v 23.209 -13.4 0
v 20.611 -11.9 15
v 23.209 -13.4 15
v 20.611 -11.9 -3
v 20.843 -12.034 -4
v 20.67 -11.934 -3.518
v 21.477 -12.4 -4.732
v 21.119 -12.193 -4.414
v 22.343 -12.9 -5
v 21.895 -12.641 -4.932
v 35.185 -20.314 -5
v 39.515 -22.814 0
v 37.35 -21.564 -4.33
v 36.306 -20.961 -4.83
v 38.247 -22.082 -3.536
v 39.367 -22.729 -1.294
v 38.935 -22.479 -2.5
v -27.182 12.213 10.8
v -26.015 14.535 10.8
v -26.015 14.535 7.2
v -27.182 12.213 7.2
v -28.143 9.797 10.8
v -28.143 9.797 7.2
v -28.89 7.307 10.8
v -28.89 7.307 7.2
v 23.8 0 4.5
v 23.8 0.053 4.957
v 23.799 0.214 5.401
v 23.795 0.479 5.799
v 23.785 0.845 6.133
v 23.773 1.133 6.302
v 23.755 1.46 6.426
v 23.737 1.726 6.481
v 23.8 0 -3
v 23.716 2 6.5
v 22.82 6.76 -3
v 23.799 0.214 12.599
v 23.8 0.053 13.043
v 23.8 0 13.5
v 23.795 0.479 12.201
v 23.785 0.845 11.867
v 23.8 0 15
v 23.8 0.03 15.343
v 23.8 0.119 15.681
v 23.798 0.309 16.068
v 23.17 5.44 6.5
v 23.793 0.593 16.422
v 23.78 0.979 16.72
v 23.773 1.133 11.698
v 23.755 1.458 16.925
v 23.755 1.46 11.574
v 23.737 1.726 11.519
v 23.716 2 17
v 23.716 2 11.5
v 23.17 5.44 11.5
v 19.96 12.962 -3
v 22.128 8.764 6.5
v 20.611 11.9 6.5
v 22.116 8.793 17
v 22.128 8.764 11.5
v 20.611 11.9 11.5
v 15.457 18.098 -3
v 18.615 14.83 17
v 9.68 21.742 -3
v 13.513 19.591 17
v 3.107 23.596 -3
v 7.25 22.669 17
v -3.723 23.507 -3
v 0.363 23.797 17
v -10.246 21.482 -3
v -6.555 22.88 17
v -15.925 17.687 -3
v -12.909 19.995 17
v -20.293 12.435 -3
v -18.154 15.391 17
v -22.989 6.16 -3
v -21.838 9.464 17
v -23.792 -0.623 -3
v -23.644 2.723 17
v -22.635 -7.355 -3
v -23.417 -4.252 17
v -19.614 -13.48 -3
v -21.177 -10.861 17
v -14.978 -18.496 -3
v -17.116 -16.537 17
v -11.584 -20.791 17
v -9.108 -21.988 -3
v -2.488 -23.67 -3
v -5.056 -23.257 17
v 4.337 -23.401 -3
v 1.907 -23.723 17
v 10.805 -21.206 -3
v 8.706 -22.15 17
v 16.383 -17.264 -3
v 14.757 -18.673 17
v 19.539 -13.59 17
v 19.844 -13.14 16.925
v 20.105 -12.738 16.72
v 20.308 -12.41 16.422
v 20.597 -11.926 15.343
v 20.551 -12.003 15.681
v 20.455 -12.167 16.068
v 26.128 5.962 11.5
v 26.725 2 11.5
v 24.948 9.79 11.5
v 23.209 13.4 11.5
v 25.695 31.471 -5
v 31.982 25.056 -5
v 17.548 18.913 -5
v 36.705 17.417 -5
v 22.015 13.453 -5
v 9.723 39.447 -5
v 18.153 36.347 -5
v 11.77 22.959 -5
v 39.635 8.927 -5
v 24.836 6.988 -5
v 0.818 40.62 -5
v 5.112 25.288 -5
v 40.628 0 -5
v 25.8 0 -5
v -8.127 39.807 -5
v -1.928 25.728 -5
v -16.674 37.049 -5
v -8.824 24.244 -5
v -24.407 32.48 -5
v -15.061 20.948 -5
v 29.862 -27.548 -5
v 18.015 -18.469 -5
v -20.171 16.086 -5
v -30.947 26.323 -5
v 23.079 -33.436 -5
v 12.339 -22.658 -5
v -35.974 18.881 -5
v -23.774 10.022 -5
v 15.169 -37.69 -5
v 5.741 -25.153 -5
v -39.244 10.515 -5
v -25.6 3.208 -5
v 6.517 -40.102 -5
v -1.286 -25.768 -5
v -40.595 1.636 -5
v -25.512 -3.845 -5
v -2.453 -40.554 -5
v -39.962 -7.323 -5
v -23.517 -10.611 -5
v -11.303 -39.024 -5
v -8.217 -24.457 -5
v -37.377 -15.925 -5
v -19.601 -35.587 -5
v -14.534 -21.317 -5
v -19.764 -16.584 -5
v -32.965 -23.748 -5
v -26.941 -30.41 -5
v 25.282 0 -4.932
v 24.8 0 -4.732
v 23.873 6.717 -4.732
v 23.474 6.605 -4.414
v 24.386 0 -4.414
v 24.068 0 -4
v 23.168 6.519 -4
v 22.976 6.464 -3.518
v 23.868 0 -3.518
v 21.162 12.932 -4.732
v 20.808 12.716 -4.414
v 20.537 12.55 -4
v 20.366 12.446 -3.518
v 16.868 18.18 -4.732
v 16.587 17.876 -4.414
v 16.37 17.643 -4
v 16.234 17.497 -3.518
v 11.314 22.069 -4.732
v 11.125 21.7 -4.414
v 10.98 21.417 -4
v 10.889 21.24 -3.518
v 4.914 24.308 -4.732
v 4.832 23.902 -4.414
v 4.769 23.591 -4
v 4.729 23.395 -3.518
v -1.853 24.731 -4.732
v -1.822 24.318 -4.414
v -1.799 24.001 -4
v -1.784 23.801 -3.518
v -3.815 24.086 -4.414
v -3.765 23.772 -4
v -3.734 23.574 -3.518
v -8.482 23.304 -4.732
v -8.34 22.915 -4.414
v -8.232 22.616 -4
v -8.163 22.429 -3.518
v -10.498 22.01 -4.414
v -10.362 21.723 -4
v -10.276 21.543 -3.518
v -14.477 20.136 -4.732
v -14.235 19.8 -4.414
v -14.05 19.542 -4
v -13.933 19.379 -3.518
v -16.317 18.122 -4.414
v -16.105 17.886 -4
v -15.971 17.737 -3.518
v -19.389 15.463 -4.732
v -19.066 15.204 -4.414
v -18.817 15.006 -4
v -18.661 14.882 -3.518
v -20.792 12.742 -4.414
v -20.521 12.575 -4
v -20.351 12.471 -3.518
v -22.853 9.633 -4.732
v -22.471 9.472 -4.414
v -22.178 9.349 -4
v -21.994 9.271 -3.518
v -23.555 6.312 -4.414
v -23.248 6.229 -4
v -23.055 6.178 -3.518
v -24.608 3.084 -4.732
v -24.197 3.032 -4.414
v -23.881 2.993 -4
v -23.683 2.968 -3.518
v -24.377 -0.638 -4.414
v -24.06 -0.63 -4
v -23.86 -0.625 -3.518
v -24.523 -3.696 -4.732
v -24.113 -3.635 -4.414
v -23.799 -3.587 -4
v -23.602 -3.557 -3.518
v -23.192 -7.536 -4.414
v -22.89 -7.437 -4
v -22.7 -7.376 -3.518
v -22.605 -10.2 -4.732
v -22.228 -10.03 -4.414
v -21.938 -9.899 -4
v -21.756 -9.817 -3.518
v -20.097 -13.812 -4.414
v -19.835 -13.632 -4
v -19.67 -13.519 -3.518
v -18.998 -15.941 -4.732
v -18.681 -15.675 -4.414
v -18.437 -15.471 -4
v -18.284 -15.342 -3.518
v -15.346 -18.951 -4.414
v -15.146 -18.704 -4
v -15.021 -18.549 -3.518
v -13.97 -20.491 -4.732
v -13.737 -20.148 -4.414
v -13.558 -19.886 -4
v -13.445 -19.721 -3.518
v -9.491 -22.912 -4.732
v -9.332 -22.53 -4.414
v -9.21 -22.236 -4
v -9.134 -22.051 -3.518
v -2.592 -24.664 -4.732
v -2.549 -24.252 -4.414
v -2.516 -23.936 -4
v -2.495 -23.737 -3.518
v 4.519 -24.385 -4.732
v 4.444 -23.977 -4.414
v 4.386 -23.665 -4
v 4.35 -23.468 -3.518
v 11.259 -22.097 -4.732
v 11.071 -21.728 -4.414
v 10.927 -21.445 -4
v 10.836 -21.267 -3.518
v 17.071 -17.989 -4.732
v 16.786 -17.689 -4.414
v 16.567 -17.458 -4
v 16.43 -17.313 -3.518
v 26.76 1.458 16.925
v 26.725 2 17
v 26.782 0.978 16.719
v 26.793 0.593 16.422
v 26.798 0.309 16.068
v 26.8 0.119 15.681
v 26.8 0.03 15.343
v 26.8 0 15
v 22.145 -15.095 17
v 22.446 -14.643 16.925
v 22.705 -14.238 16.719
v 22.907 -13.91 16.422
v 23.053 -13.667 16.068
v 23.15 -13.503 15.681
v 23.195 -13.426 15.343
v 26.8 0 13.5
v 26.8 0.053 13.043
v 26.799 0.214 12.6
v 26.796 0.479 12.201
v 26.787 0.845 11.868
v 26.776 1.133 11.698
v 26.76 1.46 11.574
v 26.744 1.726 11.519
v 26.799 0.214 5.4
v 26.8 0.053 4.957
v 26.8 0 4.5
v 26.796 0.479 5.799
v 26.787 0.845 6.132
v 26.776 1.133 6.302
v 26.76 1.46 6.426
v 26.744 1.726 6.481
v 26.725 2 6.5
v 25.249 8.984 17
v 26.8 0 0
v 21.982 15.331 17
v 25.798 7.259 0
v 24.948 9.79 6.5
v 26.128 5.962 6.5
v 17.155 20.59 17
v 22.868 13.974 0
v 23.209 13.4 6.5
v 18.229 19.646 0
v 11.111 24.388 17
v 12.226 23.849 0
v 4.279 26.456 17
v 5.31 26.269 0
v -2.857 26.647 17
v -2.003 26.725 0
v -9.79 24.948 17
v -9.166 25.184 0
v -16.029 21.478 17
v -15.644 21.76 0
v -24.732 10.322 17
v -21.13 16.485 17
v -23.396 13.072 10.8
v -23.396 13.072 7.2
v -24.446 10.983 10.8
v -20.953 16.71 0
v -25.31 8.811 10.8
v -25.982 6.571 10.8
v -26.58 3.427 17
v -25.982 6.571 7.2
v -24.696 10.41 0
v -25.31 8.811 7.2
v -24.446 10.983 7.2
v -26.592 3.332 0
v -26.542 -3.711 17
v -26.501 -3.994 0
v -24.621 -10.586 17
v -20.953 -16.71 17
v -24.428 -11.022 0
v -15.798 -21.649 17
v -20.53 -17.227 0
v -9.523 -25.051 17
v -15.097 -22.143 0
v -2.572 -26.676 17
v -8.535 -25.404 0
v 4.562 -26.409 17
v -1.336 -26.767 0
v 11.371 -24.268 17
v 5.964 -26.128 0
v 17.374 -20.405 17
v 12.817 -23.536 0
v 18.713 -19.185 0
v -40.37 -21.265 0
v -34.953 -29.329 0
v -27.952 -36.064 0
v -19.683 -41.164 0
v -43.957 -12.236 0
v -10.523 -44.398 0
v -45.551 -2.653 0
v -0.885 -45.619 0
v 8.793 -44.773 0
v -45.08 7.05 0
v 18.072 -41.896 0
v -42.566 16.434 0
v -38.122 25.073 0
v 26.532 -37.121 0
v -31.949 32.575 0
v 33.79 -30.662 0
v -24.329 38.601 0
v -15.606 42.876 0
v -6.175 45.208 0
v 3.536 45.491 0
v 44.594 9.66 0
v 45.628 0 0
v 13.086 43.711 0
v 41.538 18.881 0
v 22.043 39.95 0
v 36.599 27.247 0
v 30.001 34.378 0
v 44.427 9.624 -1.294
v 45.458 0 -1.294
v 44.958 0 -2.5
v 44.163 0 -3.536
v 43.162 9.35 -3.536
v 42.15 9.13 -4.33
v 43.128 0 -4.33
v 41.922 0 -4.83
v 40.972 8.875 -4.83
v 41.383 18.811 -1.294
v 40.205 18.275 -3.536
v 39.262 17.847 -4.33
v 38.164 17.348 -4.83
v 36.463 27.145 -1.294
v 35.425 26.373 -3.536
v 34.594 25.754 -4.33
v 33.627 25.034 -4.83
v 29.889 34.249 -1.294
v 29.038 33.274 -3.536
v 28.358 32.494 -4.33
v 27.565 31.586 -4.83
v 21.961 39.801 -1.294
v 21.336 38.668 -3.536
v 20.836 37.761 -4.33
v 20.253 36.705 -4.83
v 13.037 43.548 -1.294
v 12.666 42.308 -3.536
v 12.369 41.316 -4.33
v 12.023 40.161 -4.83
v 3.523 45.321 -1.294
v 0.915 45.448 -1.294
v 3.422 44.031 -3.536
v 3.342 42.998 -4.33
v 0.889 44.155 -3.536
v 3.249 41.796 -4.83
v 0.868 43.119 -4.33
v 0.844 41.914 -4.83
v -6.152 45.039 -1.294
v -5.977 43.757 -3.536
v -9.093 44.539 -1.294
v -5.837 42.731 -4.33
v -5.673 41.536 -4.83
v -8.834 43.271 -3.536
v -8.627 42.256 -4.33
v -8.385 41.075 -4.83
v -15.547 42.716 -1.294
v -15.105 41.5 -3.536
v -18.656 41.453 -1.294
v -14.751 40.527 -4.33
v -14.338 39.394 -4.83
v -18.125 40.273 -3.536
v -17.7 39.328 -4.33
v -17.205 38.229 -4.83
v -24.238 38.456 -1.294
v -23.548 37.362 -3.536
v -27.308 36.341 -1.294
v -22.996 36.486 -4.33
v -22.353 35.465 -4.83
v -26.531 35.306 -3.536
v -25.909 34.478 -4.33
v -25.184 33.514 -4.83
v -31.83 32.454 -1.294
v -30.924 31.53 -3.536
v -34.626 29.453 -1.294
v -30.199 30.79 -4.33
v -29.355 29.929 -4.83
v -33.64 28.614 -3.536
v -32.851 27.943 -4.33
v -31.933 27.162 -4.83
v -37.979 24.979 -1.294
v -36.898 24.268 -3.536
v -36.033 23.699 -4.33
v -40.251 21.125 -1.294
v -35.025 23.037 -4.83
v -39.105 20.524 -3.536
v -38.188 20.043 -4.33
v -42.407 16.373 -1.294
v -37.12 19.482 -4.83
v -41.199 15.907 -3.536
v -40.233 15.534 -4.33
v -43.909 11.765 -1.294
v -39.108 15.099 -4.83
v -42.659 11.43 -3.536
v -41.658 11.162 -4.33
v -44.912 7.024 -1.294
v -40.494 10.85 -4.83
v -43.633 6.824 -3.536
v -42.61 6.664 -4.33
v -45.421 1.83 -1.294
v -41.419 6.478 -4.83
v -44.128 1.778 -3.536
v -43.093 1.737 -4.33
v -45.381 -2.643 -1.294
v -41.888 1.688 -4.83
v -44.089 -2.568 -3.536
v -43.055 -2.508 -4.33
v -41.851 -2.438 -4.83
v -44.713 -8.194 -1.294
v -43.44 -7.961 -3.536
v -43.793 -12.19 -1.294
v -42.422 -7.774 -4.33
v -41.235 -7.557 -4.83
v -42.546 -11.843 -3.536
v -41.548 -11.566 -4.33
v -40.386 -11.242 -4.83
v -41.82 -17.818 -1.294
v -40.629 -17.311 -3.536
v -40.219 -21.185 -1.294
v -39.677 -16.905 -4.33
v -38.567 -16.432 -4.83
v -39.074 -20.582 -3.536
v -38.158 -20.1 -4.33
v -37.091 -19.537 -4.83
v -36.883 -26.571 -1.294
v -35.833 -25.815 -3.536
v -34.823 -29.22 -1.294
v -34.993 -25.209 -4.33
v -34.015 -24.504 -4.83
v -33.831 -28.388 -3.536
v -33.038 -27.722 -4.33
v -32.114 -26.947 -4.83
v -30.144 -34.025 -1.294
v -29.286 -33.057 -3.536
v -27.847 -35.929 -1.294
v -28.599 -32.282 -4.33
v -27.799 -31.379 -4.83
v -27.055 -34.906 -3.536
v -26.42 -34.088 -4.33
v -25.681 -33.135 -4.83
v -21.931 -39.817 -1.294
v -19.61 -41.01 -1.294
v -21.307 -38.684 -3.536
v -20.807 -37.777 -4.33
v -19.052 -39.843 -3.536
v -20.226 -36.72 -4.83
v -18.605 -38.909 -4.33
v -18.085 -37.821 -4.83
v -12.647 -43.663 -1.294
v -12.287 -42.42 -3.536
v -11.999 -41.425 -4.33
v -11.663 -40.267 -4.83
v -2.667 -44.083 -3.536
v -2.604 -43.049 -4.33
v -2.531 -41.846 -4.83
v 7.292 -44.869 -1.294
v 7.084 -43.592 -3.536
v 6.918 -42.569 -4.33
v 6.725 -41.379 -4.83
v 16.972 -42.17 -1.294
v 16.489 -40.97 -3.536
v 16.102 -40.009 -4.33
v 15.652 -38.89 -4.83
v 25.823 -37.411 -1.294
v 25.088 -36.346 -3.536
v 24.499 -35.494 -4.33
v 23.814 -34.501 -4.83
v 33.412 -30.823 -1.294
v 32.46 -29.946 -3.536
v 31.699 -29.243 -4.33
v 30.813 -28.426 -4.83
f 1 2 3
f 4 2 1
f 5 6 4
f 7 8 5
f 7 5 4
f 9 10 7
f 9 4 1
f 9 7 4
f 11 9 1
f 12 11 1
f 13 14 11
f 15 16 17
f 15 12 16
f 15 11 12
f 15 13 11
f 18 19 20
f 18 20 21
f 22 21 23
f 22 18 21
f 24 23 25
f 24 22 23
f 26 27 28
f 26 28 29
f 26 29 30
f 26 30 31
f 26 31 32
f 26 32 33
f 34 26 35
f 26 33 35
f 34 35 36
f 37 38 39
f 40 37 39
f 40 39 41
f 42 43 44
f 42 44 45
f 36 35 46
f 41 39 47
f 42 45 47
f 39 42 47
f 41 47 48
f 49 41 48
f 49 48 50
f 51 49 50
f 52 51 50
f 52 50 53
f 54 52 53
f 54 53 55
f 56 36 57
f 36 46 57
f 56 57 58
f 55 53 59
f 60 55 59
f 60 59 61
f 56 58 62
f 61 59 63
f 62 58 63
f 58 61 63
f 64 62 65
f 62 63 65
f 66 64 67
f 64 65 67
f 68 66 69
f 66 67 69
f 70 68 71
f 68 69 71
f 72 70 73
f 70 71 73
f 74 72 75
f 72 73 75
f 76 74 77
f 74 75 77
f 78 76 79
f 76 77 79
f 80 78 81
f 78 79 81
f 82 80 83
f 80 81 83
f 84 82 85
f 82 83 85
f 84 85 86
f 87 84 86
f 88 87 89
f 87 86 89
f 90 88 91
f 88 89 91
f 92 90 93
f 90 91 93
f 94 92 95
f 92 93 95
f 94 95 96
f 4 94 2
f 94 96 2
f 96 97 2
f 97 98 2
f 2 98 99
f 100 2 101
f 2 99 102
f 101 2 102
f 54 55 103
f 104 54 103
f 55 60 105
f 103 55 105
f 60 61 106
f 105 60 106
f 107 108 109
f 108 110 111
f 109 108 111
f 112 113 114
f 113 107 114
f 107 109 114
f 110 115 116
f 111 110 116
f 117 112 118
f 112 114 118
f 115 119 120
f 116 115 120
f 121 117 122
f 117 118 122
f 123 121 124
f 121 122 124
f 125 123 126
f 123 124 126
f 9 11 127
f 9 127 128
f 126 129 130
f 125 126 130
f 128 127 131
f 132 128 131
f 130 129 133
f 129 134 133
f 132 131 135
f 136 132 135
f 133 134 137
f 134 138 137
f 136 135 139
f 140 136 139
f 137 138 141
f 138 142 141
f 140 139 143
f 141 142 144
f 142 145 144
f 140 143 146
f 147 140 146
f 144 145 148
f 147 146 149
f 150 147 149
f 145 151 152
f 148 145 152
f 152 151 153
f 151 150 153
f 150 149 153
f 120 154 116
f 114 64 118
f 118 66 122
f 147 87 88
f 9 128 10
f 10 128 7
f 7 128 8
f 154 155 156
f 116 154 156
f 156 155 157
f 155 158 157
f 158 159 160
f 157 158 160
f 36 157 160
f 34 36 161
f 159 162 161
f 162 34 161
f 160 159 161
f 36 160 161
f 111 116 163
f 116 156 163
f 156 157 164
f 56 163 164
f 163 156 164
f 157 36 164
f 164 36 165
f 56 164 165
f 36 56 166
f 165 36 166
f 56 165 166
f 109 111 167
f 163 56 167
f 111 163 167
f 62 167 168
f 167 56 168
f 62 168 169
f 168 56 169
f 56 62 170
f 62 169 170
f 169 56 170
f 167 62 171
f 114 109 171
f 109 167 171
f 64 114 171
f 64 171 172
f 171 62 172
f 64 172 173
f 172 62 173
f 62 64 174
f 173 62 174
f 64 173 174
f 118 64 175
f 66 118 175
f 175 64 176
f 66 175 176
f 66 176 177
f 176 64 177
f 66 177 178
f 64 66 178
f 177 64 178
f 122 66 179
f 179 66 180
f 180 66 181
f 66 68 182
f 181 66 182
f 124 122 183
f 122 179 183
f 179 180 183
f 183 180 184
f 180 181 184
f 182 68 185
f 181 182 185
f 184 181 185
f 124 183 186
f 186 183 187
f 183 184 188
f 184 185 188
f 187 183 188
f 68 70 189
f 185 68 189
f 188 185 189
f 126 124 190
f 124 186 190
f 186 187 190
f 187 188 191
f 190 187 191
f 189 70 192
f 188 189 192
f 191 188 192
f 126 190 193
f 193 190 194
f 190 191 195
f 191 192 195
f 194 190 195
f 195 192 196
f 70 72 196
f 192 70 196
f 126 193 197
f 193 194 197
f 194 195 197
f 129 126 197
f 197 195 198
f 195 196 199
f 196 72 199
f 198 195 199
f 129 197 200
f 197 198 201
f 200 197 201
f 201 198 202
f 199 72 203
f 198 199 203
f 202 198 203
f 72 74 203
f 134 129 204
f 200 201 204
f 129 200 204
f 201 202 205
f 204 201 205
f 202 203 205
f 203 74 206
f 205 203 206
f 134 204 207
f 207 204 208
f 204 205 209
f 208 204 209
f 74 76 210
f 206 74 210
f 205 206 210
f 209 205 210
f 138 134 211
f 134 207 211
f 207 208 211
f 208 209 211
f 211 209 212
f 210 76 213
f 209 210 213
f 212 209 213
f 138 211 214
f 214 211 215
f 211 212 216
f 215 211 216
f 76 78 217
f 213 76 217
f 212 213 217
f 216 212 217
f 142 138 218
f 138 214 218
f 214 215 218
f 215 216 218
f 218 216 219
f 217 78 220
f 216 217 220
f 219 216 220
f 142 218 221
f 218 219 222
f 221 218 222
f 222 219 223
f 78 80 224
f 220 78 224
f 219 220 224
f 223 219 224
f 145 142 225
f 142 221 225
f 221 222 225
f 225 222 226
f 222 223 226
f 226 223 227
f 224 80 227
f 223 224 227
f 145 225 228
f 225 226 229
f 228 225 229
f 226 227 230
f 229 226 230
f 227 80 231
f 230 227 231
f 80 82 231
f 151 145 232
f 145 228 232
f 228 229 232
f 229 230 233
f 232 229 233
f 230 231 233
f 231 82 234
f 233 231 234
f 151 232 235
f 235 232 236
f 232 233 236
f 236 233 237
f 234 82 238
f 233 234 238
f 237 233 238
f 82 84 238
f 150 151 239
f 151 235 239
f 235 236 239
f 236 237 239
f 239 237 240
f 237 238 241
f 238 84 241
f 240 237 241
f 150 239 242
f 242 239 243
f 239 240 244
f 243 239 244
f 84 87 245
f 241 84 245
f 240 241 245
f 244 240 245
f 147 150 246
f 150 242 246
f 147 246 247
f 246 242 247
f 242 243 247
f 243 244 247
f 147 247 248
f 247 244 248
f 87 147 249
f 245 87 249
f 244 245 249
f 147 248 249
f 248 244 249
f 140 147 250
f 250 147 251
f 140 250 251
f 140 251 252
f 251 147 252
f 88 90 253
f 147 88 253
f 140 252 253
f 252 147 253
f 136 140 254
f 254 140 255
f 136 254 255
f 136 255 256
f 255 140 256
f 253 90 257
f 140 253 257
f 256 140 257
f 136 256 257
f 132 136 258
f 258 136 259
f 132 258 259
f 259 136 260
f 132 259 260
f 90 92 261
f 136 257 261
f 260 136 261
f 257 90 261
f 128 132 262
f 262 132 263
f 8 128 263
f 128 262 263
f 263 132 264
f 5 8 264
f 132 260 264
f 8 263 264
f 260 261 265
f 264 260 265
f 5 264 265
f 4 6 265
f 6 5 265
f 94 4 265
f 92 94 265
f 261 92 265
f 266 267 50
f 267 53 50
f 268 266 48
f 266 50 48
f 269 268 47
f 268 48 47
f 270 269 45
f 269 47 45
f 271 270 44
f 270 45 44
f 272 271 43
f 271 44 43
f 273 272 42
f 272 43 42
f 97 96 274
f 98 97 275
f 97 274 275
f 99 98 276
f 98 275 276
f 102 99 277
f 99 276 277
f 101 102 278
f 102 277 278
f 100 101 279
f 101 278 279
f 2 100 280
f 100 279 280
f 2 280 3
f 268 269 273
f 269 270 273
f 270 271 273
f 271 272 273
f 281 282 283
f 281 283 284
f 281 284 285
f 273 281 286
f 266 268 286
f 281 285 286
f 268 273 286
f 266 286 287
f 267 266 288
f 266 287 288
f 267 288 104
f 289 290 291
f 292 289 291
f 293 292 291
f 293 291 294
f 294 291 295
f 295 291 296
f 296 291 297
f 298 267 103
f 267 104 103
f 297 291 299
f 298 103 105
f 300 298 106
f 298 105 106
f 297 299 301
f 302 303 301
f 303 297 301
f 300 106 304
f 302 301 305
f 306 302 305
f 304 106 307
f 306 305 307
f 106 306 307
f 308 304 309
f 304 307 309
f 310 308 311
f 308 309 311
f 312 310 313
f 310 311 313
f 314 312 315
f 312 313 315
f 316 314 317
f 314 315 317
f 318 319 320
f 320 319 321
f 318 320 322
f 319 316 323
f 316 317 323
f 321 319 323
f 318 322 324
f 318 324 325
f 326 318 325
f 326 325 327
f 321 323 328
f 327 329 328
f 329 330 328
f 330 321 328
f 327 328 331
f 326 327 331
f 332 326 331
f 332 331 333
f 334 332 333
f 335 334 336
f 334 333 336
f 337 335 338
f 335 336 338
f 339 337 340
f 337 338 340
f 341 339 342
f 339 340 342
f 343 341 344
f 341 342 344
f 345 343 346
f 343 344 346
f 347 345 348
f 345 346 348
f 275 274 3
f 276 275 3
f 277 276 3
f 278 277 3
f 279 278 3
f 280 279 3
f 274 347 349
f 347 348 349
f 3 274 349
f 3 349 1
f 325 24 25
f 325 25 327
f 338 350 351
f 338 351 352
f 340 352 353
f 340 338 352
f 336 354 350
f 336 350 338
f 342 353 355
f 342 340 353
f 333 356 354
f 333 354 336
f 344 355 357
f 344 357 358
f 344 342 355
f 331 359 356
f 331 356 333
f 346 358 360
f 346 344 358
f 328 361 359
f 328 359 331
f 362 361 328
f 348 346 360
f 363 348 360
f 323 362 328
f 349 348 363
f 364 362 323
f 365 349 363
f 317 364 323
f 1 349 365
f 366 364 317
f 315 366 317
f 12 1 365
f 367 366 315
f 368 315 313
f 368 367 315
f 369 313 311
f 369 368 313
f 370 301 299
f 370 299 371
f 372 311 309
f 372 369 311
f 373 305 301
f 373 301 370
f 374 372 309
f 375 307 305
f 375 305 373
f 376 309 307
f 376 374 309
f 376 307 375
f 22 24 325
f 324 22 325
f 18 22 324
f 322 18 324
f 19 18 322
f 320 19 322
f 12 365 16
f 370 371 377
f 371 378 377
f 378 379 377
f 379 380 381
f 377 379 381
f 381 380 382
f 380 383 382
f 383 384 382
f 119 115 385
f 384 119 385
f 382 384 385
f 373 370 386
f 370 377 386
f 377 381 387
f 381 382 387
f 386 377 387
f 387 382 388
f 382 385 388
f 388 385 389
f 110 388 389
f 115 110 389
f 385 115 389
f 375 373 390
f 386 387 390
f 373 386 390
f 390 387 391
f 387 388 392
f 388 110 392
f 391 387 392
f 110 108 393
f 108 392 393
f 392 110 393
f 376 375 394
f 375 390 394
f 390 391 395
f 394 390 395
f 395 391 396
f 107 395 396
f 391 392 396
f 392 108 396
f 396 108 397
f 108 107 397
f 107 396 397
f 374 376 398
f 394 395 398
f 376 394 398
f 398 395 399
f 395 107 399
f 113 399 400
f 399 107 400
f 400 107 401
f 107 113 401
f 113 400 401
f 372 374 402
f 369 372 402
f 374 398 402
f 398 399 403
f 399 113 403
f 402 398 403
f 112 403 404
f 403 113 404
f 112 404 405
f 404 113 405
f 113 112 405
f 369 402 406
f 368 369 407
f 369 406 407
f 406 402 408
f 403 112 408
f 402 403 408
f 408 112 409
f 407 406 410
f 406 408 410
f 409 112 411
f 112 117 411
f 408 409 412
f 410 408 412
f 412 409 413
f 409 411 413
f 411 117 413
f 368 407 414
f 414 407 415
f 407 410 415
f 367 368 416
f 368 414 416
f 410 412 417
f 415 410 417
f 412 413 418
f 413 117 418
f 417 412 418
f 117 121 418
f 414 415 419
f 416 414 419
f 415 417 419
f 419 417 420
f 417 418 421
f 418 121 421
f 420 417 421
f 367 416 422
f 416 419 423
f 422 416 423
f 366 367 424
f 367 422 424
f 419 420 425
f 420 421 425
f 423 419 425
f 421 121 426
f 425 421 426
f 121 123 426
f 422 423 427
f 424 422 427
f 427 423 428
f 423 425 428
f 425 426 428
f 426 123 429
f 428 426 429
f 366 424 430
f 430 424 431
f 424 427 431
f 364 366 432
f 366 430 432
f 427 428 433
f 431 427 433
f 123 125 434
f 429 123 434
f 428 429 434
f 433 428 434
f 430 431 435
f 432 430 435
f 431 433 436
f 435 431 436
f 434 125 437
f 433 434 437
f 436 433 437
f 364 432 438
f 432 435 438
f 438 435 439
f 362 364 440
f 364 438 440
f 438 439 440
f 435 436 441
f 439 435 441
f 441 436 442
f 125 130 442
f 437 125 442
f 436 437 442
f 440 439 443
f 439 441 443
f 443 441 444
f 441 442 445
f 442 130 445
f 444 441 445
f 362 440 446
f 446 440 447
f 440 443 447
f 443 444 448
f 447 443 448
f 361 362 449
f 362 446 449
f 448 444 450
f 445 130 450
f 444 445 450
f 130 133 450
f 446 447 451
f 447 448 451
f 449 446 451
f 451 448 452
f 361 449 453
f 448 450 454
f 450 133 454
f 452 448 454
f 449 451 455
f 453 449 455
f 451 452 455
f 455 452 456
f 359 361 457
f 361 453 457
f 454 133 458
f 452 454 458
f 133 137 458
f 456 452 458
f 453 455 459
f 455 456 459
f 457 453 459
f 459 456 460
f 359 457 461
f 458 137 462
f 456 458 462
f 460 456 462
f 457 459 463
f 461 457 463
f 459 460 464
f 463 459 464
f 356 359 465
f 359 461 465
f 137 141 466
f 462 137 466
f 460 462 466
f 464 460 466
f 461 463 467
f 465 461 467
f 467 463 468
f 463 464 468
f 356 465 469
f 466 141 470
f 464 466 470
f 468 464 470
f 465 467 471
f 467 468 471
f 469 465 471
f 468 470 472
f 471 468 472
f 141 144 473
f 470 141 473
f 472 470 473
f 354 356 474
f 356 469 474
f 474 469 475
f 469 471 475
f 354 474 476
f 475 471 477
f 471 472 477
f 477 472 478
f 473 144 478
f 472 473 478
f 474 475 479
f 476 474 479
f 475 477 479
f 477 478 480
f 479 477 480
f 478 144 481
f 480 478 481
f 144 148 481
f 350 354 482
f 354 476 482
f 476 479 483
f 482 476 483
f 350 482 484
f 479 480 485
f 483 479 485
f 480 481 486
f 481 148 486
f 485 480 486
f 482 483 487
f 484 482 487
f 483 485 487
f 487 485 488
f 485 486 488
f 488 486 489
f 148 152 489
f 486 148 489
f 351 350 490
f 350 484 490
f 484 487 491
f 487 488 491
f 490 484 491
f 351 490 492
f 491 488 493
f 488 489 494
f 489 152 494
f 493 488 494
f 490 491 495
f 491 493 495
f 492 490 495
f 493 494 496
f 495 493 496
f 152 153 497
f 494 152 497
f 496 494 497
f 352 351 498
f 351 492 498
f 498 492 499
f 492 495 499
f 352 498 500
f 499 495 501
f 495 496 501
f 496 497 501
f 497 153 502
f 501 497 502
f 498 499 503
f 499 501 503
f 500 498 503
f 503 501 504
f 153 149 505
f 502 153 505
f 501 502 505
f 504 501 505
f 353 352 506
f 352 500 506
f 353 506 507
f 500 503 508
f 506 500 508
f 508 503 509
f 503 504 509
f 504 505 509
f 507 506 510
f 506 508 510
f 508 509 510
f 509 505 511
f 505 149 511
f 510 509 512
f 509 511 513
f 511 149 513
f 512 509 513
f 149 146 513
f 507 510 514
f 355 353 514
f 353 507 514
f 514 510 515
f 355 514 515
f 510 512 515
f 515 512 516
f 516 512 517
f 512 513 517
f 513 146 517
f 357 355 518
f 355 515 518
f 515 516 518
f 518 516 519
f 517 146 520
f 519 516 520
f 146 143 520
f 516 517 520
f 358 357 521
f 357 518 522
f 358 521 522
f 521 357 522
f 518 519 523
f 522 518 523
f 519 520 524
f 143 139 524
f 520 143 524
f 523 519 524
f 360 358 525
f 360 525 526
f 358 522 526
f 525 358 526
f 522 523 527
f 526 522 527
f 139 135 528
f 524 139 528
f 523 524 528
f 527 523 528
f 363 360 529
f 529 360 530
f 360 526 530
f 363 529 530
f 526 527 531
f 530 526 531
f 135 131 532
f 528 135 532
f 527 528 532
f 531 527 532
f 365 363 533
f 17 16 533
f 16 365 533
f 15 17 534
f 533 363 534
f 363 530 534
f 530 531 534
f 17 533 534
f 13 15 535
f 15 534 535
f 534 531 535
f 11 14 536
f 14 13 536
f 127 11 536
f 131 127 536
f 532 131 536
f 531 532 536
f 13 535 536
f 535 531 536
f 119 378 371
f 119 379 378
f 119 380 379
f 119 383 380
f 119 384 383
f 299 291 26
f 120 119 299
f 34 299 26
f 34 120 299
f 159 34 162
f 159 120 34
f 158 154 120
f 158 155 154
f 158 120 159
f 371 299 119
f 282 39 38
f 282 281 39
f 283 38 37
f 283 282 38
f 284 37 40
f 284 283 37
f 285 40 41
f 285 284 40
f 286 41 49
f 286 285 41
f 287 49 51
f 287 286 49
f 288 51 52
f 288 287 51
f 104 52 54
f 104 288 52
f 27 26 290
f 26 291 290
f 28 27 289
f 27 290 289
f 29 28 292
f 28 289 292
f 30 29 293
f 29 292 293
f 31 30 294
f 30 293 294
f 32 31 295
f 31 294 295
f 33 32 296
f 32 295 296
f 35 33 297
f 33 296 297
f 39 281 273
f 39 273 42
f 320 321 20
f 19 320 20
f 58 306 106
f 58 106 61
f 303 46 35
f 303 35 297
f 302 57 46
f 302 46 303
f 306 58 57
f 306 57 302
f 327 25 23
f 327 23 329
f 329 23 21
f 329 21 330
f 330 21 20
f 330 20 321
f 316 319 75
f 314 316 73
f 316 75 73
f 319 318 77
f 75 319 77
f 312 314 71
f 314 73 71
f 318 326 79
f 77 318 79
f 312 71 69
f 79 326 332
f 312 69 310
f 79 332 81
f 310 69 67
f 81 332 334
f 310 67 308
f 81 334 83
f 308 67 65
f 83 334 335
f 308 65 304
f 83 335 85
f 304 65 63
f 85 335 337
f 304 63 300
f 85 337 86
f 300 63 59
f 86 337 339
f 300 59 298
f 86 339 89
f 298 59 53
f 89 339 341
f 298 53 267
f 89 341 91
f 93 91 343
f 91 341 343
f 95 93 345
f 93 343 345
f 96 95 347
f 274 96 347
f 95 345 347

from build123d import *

# Parameters (mm, degrees)
F3_DEPTH      = 17.001
F3_DEPTH_BACK = 25
F6_DEPTH      = 2.5
F7_R          = 2
F8_DEPTH      = 1.8


with BuildPart() as f1:
    # F0 (on Front) → F1 (revolve)
    with BuildSketch(Plane.XZ):
        with BuildLine():
            Line((-23.8, 17), (-26.8, 17))
            Line((-26.8, 17), (-26.8, 0))
            Line((-26.8, 0), (-45.6279513852, 0))
            ThreePointArc((-45.6279513852, 0), (-44.1634852911, -3.5355339059), (-40.6279513852, -5))
            Line((-40.6279513852, -5), (-25.8, -5))
            ThreePointArc((-25.8, -5), (-24.3857864376, -4.4142135624), (-23.8, -3))
            Line((-23.8, -3), (-23.8, 17))
        make_face()
    revolve(axis=Axis((0, 0, 7.2955568321), (0, 0, 1)))

    # F2 (on Top) → F3 (cut, two sides)
    with BuildSketch(Plane.XY) as f3_sk:
        Polygon((53.3640757203, 0), (0, 0), (46.3265438035, -26.7466425355), align=None)
    extrude(amount=F3_DEPTH, mode=Mode.SUBTRACT)
    extrude(f3_sk.sketch, amount=-F3_DEPTH_BACK, mode=Mode.SUBTRACT)

    # F5 (on offset) → F6 (cut, symmetric)
    with BuildSketch(Plane.XY.offset(9)):
        Polygon((26.6670817875, 15.3962468485), (0, 0), (30.5216945708, 0), align=None)
    extrude(amount=F6_DEPTH, both=True, mode=Mode.SUBTRACT)

    # F7
    f7_edges = [f1.edges().sort_by_distance(p)[0] for p in [
        (21.910443, -12.65, 17),
        (25.3, 0, 17),
        (25.3, 0, 11.5),
        (25.3, 0, 6.5),
    ]]
    fillet(f7_edges, radius=F7_R)

    # F5 (on offset) → F8 (join, symmetric)
    with BuildSketch(Plane.XY.offset(9)):
        with BuildLine():
            Line((-21.9827251313, 12.2826441446), (-26.0146328451, 14.535435251))
            ThreePointArc((-26.0146328451, 14.535435251), (-27.6893290703, 11.0154916202), (-28.8902531983, 7.3070698737))
            Line((-28.8902531983, 7.3070698737), (-23.0896898866, 5.8399618793))
            Line((-23.0896898866, 5.8399618793), (-21.9827251313, 12.2826441446))
        make_face()
    extrude(amount=F8_DEPTH, both=True)


solid = f1.part
